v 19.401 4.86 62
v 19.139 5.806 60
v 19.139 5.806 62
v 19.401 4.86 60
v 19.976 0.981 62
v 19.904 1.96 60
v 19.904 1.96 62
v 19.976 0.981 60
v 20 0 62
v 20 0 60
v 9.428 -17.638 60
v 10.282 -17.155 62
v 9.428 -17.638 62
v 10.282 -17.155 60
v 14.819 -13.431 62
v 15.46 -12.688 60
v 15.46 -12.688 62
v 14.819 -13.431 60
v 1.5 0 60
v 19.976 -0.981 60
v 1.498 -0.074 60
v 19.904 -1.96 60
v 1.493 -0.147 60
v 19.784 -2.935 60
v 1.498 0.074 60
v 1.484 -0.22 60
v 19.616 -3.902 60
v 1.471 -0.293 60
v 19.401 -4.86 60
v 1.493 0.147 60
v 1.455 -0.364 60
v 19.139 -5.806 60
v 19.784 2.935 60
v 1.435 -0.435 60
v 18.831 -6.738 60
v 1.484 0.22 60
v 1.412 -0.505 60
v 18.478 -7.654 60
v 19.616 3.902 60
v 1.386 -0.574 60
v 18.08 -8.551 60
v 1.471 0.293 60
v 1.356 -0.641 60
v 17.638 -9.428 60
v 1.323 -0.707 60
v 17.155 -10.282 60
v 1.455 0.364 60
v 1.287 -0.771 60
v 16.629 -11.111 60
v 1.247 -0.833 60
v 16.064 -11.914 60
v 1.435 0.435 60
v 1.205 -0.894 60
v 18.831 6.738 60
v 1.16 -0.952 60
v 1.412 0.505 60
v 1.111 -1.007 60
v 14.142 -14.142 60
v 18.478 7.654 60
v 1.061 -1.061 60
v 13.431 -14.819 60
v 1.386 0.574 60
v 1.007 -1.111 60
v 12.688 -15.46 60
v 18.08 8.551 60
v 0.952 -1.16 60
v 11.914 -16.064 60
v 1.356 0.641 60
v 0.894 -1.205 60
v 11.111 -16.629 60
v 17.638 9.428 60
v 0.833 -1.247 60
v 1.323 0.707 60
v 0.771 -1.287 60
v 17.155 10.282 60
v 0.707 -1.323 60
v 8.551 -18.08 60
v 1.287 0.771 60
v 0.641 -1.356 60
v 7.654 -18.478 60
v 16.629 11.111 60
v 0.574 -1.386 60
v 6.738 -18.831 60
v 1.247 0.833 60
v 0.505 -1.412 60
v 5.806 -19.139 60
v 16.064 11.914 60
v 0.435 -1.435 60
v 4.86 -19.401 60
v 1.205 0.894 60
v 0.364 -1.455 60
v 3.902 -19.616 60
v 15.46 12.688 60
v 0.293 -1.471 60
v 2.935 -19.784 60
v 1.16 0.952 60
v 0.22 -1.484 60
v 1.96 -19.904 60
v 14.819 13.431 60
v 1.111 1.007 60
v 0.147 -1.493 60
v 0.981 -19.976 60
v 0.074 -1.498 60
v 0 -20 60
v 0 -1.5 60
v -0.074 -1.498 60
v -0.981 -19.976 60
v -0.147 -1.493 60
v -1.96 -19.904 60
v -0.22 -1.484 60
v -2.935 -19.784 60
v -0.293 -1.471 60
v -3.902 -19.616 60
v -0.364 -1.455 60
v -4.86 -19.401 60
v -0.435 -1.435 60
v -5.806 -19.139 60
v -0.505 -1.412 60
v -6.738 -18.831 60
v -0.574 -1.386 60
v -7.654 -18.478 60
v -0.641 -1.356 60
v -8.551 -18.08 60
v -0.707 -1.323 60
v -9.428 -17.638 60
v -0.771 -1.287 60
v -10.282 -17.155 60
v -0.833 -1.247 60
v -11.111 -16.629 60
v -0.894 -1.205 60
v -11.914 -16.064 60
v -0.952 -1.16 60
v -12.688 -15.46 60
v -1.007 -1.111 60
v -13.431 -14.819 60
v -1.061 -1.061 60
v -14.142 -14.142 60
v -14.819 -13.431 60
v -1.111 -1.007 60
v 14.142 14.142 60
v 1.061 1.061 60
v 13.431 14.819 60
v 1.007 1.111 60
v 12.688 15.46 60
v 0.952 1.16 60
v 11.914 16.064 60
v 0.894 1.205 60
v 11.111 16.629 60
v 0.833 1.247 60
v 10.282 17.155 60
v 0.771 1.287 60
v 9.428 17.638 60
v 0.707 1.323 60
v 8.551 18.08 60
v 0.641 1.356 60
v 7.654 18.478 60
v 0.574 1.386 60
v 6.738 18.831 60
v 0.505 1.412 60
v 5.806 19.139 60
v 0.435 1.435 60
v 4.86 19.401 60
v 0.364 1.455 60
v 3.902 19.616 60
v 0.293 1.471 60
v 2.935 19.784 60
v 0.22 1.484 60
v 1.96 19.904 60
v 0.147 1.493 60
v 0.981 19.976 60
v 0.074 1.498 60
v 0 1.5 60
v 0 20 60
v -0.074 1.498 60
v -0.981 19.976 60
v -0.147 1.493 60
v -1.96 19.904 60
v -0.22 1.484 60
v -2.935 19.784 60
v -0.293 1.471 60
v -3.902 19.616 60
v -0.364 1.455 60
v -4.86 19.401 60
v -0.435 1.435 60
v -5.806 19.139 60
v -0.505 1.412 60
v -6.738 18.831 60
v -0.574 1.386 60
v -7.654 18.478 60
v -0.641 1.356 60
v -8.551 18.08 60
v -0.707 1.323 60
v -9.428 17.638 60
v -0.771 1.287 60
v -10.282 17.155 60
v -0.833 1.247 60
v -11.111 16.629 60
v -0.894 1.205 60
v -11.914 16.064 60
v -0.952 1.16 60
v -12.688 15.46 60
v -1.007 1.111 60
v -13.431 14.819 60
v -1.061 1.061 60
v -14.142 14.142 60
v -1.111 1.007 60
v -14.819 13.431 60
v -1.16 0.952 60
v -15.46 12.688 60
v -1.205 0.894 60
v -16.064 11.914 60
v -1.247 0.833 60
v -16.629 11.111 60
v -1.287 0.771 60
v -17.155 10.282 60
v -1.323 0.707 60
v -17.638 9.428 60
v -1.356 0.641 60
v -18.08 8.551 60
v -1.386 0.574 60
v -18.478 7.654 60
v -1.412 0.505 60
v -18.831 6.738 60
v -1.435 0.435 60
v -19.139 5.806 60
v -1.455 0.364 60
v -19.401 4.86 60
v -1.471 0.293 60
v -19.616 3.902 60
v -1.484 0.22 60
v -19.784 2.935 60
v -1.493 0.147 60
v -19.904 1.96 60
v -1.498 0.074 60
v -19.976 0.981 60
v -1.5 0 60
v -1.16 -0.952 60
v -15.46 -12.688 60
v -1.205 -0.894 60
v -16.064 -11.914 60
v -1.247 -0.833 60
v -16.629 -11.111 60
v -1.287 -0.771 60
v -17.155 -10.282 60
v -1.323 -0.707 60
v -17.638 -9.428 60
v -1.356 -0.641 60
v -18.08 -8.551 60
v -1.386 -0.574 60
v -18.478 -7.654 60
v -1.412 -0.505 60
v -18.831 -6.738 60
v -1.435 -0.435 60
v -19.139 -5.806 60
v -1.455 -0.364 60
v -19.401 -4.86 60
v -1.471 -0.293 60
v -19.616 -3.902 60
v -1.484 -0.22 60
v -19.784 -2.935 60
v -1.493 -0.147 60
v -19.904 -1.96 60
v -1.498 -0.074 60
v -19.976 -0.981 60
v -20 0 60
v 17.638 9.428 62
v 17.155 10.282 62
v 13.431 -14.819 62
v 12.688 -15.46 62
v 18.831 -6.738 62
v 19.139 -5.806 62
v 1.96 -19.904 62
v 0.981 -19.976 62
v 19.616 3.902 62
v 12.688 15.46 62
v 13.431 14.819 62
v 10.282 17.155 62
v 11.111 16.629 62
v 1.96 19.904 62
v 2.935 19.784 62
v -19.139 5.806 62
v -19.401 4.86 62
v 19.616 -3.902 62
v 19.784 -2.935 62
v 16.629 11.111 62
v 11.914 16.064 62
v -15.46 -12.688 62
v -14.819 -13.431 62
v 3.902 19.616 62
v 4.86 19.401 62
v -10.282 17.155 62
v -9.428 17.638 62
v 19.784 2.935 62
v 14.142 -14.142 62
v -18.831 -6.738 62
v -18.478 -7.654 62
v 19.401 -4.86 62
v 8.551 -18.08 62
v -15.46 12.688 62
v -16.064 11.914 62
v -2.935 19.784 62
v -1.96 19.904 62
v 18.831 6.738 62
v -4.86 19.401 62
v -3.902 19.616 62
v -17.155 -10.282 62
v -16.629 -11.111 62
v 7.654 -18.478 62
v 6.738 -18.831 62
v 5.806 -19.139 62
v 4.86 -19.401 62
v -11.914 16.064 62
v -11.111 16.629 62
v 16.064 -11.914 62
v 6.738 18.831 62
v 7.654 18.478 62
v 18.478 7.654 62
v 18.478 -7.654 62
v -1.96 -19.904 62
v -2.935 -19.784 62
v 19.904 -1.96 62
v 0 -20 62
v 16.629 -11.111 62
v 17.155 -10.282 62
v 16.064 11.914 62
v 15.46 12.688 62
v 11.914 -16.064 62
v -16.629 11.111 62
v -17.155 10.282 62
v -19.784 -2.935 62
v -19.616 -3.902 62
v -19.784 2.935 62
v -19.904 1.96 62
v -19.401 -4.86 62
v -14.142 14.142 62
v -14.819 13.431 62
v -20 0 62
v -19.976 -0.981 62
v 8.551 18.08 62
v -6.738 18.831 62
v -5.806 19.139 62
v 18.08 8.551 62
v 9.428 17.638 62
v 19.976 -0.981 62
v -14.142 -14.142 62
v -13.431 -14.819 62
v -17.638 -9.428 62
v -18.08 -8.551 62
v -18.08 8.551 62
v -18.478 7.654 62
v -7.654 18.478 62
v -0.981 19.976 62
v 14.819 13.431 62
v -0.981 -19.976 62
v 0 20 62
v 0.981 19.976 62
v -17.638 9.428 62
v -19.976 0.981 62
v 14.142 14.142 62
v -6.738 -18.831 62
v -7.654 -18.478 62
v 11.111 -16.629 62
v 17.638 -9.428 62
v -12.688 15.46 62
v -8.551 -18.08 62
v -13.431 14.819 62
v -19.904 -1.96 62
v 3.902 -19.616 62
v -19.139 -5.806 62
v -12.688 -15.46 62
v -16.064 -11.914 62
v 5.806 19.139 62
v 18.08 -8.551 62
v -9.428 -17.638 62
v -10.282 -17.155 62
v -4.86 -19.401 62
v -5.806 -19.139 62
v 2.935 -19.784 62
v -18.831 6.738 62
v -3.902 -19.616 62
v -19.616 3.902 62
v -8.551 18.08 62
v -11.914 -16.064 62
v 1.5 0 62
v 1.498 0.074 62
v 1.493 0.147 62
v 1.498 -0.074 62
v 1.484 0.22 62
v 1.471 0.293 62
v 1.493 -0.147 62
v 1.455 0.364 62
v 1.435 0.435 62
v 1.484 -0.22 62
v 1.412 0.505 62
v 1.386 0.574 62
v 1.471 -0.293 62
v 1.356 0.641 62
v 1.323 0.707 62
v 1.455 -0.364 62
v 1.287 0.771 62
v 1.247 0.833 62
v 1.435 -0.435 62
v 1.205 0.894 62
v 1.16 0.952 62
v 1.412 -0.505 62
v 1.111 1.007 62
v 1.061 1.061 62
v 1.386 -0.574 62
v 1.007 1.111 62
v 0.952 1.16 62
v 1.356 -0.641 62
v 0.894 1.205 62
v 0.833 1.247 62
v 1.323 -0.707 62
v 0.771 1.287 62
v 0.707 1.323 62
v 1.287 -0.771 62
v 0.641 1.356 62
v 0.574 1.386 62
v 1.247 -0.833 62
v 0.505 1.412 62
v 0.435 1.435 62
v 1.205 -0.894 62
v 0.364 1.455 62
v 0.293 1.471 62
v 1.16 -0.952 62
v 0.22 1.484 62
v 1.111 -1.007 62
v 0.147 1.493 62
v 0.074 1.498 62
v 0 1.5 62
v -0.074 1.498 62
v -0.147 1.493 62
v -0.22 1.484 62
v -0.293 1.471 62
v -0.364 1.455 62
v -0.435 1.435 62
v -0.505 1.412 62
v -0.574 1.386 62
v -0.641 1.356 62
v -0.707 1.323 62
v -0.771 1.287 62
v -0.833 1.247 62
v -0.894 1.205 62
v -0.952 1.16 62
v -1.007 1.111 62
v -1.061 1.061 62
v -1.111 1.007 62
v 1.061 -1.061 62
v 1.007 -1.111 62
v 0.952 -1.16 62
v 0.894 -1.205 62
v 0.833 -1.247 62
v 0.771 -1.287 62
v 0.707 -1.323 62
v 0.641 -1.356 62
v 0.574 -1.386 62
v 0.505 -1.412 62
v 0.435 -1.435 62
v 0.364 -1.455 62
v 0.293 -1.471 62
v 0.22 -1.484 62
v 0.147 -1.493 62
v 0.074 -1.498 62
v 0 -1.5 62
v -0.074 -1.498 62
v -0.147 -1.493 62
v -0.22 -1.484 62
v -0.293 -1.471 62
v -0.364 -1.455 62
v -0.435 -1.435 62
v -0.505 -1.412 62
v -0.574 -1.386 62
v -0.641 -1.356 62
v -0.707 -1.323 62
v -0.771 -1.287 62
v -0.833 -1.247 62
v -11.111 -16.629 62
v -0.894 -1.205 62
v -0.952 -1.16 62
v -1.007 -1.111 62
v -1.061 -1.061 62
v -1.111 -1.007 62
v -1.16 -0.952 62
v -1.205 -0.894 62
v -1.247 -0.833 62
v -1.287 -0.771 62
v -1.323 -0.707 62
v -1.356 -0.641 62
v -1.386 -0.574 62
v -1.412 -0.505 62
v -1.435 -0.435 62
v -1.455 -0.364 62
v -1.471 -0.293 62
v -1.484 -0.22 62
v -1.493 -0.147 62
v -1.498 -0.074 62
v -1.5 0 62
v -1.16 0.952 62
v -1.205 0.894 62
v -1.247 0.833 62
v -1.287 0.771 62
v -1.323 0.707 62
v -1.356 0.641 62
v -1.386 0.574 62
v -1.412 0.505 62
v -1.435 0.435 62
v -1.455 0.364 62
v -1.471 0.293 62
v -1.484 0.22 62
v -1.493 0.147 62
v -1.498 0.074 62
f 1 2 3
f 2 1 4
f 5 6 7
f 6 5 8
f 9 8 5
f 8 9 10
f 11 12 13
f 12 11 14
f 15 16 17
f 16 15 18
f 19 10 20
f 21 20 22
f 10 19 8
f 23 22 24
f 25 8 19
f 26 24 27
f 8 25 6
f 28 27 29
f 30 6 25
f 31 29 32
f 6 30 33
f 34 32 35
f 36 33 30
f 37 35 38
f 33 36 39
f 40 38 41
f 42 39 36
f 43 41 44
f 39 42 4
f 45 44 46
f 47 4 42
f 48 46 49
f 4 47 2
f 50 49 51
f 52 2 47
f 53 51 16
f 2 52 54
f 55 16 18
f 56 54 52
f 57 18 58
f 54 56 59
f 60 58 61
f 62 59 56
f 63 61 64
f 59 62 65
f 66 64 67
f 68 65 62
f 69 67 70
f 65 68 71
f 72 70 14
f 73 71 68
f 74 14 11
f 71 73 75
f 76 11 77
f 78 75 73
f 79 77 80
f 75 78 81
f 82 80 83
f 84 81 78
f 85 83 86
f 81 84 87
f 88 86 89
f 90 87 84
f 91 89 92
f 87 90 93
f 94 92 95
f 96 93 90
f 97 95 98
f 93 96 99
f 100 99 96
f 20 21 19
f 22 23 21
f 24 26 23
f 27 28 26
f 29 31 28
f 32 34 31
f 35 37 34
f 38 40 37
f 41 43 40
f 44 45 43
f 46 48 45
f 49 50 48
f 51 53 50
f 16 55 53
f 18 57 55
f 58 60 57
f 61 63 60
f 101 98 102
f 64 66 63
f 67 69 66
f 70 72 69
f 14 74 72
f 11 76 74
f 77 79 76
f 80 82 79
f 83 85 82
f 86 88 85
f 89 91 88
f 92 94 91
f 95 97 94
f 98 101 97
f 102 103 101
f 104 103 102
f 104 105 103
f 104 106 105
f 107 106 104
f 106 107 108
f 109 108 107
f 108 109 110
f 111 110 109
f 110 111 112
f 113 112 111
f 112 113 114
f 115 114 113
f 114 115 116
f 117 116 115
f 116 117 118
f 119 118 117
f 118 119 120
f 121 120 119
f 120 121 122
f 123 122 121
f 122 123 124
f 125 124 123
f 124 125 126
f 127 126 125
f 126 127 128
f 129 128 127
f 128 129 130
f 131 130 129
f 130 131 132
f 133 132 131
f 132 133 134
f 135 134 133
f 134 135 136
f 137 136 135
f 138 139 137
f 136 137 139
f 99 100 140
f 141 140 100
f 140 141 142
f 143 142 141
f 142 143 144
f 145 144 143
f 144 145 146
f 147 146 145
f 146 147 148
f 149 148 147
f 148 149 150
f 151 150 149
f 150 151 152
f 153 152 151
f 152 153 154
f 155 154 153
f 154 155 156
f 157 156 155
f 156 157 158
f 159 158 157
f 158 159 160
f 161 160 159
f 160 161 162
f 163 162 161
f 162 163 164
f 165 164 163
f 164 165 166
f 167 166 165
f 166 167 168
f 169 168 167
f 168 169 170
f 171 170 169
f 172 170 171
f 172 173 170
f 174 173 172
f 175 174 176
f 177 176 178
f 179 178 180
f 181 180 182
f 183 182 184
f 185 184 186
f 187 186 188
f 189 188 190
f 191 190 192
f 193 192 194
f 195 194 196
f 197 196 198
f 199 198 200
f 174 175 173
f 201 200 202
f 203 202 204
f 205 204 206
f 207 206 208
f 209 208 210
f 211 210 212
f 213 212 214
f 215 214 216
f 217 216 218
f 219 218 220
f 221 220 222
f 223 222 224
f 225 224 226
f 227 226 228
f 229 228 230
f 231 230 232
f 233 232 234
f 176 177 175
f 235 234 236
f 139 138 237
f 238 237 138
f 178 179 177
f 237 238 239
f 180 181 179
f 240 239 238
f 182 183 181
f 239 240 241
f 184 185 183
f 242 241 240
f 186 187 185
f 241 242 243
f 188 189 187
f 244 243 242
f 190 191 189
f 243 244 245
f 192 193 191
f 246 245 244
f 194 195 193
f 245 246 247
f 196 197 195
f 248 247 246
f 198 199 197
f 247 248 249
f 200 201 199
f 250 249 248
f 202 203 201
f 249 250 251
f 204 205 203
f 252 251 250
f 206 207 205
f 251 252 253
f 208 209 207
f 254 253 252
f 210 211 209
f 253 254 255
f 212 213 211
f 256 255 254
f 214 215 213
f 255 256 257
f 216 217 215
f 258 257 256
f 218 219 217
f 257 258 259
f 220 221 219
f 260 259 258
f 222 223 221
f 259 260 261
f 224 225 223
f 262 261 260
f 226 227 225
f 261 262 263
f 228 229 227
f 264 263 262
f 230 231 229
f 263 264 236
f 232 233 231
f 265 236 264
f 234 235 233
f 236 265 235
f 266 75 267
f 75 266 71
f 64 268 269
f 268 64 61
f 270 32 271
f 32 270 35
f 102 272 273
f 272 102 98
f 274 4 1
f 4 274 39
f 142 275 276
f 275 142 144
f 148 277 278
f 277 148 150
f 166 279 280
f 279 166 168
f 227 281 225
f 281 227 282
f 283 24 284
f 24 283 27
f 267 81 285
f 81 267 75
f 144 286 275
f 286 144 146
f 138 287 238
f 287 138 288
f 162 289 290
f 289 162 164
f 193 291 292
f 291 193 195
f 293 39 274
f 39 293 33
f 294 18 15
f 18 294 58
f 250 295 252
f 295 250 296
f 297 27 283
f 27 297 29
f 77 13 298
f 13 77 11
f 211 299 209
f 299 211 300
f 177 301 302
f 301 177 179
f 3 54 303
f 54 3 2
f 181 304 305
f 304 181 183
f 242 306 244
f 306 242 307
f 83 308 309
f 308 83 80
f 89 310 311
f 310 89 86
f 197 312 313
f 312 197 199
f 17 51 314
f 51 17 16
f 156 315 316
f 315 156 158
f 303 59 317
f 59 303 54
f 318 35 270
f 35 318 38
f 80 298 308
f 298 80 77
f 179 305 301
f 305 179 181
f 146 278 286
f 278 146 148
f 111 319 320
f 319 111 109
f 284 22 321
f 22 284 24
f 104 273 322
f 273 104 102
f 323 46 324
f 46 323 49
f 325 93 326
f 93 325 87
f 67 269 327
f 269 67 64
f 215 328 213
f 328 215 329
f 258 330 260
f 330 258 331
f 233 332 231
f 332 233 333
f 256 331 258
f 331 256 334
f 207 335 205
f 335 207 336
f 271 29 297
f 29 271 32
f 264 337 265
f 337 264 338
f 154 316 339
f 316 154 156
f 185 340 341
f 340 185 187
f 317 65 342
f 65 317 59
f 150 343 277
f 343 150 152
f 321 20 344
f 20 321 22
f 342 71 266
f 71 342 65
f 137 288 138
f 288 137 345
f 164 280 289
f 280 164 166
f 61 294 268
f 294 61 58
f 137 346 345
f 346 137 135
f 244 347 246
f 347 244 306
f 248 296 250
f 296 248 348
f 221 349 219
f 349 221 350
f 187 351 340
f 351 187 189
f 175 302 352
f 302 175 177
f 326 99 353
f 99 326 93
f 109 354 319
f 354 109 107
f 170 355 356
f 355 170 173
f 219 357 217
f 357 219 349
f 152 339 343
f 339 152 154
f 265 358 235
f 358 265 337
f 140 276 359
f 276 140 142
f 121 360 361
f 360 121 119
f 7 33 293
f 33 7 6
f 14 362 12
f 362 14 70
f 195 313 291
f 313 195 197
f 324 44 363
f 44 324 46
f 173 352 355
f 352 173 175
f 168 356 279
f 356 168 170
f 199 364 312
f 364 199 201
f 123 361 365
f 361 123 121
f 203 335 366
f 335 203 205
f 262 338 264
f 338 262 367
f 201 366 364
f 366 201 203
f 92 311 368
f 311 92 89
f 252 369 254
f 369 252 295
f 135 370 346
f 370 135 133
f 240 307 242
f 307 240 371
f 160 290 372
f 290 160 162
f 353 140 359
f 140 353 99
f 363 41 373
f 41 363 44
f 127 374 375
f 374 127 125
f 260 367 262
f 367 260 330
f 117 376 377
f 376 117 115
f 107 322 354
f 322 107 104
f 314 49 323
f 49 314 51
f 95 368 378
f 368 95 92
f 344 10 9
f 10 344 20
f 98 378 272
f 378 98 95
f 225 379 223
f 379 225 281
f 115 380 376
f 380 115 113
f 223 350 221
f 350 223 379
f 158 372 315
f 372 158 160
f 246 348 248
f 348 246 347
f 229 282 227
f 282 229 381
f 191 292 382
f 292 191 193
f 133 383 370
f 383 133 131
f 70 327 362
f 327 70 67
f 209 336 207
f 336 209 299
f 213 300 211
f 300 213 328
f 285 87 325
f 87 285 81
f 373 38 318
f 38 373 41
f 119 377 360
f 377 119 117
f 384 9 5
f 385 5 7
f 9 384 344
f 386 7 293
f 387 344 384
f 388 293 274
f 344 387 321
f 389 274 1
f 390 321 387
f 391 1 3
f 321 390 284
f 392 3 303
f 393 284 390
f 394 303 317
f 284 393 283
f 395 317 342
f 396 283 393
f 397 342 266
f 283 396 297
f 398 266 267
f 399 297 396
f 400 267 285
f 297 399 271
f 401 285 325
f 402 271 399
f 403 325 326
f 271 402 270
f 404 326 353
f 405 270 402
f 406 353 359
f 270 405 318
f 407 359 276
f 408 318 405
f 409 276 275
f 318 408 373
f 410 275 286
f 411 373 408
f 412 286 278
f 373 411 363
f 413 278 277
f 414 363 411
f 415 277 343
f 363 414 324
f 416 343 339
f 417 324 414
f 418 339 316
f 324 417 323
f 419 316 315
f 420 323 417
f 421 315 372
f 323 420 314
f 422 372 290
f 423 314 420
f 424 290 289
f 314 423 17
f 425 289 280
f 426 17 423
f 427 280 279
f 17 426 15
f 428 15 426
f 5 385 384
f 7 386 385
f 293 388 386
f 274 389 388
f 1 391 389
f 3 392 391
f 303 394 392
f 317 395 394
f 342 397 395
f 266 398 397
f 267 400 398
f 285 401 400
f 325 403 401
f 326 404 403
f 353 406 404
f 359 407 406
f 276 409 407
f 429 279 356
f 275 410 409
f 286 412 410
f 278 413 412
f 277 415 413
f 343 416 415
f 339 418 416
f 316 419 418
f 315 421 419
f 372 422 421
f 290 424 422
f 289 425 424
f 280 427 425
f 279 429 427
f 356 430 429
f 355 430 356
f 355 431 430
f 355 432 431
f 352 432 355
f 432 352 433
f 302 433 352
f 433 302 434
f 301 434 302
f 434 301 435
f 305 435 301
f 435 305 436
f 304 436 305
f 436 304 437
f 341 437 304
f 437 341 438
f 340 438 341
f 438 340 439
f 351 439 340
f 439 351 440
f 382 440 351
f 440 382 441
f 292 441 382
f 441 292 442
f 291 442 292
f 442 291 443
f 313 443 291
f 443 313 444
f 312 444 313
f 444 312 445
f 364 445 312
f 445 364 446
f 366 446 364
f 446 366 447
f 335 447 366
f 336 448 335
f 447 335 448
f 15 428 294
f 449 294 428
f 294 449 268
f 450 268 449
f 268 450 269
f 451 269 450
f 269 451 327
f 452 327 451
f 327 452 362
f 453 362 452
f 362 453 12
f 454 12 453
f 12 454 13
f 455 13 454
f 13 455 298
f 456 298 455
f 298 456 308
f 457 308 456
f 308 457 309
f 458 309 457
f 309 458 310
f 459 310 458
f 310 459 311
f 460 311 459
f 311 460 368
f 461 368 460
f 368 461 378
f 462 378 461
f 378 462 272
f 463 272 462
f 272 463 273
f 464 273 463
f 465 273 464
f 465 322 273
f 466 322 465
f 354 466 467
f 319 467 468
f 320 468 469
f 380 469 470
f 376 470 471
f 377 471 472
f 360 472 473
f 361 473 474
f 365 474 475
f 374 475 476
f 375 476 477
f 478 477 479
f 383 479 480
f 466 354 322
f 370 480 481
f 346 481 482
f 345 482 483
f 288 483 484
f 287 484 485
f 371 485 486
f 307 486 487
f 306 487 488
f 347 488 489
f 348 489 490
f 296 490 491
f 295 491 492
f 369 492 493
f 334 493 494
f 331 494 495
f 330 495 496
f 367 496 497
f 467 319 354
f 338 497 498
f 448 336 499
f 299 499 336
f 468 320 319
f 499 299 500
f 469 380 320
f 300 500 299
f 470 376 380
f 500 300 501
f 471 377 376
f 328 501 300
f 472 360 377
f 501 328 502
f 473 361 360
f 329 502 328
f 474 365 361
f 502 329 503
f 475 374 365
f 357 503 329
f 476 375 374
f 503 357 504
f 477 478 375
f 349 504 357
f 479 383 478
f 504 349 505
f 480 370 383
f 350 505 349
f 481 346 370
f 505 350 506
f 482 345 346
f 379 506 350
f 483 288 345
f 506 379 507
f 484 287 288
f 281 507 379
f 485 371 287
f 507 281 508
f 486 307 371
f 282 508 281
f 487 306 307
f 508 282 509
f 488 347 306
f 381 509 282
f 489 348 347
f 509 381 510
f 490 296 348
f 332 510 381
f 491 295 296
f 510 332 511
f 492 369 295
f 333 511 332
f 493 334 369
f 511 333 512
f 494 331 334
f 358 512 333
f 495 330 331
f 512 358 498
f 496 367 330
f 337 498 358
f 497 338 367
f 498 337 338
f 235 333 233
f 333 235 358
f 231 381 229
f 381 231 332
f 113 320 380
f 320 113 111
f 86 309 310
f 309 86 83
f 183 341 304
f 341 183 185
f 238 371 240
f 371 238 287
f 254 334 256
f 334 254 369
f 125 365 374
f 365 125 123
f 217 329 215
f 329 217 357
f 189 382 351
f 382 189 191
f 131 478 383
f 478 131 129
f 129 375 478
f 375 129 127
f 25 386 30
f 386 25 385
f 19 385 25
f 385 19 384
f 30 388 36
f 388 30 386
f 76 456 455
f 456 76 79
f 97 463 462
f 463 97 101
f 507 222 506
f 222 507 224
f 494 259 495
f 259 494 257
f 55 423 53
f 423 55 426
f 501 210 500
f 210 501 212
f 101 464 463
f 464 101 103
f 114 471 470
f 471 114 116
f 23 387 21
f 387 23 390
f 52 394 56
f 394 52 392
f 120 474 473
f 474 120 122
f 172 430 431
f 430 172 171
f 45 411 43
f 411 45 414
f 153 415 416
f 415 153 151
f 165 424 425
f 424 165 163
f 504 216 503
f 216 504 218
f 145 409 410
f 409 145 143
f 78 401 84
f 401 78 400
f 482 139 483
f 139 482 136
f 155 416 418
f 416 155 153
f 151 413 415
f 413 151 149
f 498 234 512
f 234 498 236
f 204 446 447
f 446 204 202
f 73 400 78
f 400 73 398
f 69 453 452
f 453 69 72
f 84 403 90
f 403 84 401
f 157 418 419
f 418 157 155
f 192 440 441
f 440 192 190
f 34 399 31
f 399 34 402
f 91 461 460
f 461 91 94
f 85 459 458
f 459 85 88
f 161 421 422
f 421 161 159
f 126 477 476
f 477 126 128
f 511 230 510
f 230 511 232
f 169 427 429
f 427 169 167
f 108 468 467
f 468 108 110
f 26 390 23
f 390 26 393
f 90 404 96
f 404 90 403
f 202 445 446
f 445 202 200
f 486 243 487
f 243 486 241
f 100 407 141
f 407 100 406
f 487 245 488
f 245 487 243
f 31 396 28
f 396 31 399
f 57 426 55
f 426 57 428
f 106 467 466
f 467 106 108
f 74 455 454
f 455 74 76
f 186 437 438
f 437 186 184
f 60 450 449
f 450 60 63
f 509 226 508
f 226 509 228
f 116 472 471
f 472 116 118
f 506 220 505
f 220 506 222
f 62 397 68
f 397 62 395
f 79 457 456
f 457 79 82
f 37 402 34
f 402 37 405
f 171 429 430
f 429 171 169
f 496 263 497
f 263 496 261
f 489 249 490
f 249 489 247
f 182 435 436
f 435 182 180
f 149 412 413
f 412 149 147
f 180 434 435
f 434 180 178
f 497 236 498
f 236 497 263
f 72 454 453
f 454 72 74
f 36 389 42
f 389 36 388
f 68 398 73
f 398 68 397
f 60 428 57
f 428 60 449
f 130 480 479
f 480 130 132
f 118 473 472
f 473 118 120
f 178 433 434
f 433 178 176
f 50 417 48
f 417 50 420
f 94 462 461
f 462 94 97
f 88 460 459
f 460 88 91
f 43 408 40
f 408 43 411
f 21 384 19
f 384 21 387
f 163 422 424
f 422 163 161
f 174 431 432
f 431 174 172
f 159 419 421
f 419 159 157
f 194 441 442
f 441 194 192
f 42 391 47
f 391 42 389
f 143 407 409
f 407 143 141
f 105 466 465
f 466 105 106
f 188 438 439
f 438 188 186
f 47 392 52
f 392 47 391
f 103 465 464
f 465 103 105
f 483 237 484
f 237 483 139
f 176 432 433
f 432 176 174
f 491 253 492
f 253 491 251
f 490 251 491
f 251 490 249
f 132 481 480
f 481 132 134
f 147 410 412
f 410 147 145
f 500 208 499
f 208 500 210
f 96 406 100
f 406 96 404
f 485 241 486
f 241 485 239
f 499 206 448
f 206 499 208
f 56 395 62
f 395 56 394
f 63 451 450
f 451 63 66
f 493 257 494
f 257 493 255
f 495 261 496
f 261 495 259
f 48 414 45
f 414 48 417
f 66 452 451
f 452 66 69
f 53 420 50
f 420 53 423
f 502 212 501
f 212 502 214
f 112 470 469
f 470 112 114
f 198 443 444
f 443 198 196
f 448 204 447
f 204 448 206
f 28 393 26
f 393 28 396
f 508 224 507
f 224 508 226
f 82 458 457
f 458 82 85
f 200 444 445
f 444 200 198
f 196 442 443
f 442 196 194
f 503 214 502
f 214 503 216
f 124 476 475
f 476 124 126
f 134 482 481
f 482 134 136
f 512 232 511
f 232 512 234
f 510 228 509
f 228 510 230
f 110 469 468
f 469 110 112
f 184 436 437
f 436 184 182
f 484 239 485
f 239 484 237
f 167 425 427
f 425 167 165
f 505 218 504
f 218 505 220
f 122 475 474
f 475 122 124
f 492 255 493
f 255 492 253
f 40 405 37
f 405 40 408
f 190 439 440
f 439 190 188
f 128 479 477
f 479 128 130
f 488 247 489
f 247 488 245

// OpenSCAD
// file: common_params.scad
cylinder_radius = 20.000000;
cylinder_height = 60.000000;
wall_thickness = 2.000000;

cap_thickness = 2.000000;

rod_radius = 2.000000;
rod_height = 50.000000;

ring_outer_radius = 8.000000;
ring_inner_radius = 4.000000;
ring_thickness = 3.000000;
ring_z = 40.000000;

$fn = 128;
// main file
include <common_params.scad>;

hole_radius = 1.500000;

translate([0, 0, cylinder_height])
difference() {
    cylinder(h = cap_thickness, r = cylinder_radius);
    translate([0, 0, -0.1])
        cylinder(h = cap_thickness + 0.2, r = hole_radius);
}
